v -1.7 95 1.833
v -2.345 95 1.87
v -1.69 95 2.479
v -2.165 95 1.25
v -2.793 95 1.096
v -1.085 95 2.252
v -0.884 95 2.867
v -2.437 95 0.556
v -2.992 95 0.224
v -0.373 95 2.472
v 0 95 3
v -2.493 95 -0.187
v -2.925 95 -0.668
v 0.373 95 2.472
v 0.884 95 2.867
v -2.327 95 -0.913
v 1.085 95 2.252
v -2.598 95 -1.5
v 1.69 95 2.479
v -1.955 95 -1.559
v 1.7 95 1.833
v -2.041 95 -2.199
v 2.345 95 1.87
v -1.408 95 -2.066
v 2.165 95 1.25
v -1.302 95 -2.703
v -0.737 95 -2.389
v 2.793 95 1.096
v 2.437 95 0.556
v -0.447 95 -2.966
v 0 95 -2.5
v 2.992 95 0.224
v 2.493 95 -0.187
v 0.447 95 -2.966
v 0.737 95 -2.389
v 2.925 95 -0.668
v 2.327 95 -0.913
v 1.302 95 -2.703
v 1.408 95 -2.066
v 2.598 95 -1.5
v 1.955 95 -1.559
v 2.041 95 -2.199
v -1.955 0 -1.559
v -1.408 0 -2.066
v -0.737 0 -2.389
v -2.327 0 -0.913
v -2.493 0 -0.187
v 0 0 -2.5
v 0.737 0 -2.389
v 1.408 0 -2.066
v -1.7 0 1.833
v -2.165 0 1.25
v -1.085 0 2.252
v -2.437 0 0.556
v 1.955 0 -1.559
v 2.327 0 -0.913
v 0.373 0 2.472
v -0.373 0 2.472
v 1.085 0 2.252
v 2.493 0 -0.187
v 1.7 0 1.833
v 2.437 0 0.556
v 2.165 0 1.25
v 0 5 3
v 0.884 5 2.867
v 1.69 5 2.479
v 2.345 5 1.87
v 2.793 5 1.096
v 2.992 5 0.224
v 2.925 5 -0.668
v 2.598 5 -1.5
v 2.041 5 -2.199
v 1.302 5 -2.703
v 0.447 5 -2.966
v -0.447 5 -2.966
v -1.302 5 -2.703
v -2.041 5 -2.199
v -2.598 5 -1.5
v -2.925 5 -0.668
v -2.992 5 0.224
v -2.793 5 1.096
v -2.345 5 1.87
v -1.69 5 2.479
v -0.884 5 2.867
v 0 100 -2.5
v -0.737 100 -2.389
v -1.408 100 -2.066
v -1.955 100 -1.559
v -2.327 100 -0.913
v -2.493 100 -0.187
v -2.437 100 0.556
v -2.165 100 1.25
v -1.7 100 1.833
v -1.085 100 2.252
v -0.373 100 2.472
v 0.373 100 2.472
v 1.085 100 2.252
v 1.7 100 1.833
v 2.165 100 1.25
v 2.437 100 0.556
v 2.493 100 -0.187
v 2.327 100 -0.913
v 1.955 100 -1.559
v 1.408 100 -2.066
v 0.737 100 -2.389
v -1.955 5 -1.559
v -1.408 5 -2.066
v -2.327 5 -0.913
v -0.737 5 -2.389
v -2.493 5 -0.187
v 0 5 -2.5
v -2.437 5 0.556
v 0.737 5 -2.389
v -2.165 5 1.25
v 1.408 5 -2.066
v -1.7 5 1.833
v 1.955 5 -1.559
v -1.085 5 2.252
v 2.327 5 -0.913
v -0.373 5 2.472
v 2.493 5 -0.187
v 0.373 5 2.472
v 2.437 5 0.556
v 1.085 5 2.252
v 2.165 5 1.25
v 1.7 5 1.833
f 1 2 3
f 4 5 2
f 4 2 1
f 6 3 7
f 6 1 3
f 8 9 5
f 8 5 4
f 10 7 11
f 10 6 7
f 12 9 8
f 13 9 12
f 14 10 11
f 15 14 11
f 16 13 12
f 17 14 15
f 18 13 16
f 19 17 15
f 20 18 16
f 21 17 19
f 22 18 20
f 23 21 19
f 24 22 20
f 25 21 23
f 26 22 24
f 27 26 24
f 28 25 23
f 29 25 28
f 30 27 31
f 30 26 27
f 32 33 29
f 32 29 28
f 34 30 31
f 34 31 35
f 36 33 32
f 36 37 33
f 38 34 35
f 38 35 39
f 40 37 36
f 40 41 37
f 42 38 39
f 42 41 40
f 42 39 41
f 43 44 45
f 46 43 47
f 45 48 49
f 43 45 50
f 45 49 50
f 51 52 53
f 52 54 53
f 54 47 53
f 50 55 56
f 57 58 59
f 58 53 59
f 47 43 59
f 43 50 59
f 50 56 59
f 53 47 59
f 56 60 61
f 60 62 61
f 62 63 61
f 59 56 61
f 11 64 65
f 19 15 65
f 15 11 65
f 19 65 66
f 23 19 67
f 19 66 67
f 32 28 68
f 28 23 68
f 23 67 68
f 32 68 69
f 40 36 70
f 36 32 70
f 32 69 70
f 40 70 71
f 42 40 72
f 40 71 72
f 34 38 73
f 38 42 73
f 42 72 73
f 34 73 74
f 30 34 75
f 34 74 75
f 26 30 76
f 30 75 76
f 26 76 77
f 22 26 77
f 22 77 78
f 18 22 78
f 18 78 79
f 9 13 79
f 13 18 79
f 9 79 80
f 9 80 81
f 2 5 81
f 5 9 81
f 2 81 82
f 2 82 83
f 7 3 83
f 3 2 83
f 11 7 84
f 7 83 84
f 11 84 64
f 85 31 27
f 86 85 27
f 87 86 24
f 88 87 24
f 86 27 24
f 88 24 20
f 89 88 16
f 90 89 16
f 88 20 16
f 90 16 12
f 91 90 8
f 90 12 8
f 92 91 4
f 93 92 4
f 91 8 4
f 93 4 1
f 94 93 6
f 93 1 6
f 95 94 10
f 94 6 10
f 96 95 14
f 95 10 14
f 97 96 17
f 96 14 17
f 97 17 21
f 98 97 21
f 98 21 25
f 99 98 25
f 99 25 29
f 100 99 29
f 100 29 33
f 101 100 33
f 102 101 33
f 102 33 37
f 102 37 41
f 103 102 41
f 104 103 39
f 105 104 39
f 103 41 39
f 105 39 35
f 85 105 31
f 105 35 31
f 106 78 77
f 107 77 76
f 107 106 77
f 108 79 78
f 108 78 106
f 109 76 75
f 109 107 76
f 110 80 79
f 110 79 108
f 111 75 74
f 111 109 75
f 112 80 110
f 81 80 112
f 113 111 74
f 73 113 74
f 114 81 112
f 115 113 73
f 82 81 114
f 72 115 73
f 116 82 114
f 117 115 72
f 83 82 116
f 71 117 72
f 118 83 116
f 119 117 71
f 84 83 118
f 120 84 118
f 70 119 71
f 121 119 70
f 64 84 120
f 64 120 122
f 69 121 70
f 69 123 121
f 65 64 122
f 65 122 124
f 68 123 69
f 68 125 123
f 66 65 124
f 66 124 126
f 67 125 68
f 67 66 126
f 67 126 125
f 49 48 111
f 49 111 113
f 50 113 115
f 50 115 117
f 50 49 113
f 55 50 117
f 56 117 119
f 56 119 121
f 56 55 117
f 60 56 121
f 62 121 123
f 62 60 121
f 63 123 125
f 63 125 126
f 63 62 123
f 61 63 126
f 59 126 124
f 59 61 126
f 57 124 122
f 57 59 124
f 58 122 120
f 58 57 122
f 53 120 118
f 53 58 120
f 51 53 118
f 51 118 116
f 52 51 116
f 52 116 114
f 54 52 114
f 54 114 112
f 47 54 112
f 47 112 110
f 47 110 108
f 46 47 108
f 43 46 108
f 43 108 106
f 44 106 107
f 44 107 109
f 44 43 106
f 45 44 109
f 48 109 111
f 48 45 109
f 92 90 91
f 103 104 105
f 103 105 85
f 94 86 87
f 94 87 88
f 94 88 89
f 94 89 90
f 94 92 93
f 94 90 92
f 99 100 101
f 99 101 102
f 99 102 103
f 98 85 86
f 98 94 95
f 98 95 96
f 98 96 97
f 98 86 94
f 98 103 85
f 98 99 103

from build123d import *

# Parameters (mm, degrees)
SKETCH1_R           = 3
BOSS_EXTRUDE1_DEPTH = 100
SKETCH2_R           = 3.804683346
SKETCH2_R_2         = 2.5
CUT_EXTRUDE1_DEPTH  = 5
CUT_EXTRUDE2_START  = -5
SKETCH3_R           = 4.634260774
SKETCH3_R_2         = 2.5
CUT_EXTRUDE2_DEPTH  = 5


with BuildPart() as part:
    # Sketch1 → Boss-Extrude1 (new body)
    with BuildSketch(Plane(origin=(0, 0, 0), x_dir=(1, 0, 0), z_dir=(0, 1, 0))):
        with Locations(Location((0, 0, 0), (0, 0, 270))):
            Circle(SKETCH1_R)
    extrude(amount=BOSS_EXTRUDE1_DEPTH)

    # Sketch2 → Cut-Extrude1 (cut)
    with BuildSketch(Plane.XZ):
        Circle(SKETCH2_R)
        with Locations(Location((0, 0, 0), (0, 0, 270))):
            Circle(SKETCH2_R_2, mode=Mode.SUBTRACT)
    extrude(amount=-CUT_EXTRUDE1_DEPTH, mode=Mode.SUBTRACT)

    # Sketch3 → Cut-Extrude2 (cut)
    with BuildSketch(Plane(origin=(0, 100, 0), x_dir=(1, 0, 0), z_dir=(0, 1, 0)).offset(CUT_EXTRUDE2_START)):
        Circle(SKETCH3_R)
        with Locations(Location((0, 0, 0), (0, 0, 90))):
            Circle(SKETCH3_R_2, mode=Mode.SUBTRACT)
    extrude(amount=CUT_EXTRUDE2_DEPTH, mode=Mode.SUBTRACT)


solid = part.part
